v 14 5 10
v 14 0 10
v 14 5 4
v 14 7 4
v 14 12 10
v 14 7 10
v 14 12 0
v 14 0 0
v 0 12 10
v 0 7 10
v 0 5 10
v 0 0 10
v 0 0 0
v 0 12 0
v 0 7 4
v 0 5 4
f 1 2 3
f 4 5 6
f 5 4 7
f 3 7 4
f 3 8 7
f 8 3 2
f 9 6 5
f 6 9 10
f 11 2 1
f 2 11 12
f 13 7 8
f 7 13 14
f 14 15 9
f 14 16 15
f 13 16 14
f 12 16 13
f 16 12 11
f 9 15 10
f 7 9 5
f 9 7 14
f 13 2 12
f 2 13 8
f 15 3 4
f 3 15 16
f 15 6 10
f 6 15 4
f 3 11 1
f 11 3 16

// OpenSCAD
$fn = 32;

// ----------------------------------------------------------------------
// Micro clip: slotted block, 5-20 mm class
// ----------------------------------------------------------------------

// --- parameters (mm) ---
block_l = 14;             // block length, X
block_w = 12;             // block width, Y
block_h = 10;             // block height, Z
slot_w = 2;               // slot width
slot_d = 6;               // slot depth from the top

difference() {
  cube([block_l, block_w, block_h]);
  translate([-1, block_w / 2 - slot_w / 2, block_h - slot_d])
    cube([block_l + 2, slot_w, slot_d + 1]);
}
